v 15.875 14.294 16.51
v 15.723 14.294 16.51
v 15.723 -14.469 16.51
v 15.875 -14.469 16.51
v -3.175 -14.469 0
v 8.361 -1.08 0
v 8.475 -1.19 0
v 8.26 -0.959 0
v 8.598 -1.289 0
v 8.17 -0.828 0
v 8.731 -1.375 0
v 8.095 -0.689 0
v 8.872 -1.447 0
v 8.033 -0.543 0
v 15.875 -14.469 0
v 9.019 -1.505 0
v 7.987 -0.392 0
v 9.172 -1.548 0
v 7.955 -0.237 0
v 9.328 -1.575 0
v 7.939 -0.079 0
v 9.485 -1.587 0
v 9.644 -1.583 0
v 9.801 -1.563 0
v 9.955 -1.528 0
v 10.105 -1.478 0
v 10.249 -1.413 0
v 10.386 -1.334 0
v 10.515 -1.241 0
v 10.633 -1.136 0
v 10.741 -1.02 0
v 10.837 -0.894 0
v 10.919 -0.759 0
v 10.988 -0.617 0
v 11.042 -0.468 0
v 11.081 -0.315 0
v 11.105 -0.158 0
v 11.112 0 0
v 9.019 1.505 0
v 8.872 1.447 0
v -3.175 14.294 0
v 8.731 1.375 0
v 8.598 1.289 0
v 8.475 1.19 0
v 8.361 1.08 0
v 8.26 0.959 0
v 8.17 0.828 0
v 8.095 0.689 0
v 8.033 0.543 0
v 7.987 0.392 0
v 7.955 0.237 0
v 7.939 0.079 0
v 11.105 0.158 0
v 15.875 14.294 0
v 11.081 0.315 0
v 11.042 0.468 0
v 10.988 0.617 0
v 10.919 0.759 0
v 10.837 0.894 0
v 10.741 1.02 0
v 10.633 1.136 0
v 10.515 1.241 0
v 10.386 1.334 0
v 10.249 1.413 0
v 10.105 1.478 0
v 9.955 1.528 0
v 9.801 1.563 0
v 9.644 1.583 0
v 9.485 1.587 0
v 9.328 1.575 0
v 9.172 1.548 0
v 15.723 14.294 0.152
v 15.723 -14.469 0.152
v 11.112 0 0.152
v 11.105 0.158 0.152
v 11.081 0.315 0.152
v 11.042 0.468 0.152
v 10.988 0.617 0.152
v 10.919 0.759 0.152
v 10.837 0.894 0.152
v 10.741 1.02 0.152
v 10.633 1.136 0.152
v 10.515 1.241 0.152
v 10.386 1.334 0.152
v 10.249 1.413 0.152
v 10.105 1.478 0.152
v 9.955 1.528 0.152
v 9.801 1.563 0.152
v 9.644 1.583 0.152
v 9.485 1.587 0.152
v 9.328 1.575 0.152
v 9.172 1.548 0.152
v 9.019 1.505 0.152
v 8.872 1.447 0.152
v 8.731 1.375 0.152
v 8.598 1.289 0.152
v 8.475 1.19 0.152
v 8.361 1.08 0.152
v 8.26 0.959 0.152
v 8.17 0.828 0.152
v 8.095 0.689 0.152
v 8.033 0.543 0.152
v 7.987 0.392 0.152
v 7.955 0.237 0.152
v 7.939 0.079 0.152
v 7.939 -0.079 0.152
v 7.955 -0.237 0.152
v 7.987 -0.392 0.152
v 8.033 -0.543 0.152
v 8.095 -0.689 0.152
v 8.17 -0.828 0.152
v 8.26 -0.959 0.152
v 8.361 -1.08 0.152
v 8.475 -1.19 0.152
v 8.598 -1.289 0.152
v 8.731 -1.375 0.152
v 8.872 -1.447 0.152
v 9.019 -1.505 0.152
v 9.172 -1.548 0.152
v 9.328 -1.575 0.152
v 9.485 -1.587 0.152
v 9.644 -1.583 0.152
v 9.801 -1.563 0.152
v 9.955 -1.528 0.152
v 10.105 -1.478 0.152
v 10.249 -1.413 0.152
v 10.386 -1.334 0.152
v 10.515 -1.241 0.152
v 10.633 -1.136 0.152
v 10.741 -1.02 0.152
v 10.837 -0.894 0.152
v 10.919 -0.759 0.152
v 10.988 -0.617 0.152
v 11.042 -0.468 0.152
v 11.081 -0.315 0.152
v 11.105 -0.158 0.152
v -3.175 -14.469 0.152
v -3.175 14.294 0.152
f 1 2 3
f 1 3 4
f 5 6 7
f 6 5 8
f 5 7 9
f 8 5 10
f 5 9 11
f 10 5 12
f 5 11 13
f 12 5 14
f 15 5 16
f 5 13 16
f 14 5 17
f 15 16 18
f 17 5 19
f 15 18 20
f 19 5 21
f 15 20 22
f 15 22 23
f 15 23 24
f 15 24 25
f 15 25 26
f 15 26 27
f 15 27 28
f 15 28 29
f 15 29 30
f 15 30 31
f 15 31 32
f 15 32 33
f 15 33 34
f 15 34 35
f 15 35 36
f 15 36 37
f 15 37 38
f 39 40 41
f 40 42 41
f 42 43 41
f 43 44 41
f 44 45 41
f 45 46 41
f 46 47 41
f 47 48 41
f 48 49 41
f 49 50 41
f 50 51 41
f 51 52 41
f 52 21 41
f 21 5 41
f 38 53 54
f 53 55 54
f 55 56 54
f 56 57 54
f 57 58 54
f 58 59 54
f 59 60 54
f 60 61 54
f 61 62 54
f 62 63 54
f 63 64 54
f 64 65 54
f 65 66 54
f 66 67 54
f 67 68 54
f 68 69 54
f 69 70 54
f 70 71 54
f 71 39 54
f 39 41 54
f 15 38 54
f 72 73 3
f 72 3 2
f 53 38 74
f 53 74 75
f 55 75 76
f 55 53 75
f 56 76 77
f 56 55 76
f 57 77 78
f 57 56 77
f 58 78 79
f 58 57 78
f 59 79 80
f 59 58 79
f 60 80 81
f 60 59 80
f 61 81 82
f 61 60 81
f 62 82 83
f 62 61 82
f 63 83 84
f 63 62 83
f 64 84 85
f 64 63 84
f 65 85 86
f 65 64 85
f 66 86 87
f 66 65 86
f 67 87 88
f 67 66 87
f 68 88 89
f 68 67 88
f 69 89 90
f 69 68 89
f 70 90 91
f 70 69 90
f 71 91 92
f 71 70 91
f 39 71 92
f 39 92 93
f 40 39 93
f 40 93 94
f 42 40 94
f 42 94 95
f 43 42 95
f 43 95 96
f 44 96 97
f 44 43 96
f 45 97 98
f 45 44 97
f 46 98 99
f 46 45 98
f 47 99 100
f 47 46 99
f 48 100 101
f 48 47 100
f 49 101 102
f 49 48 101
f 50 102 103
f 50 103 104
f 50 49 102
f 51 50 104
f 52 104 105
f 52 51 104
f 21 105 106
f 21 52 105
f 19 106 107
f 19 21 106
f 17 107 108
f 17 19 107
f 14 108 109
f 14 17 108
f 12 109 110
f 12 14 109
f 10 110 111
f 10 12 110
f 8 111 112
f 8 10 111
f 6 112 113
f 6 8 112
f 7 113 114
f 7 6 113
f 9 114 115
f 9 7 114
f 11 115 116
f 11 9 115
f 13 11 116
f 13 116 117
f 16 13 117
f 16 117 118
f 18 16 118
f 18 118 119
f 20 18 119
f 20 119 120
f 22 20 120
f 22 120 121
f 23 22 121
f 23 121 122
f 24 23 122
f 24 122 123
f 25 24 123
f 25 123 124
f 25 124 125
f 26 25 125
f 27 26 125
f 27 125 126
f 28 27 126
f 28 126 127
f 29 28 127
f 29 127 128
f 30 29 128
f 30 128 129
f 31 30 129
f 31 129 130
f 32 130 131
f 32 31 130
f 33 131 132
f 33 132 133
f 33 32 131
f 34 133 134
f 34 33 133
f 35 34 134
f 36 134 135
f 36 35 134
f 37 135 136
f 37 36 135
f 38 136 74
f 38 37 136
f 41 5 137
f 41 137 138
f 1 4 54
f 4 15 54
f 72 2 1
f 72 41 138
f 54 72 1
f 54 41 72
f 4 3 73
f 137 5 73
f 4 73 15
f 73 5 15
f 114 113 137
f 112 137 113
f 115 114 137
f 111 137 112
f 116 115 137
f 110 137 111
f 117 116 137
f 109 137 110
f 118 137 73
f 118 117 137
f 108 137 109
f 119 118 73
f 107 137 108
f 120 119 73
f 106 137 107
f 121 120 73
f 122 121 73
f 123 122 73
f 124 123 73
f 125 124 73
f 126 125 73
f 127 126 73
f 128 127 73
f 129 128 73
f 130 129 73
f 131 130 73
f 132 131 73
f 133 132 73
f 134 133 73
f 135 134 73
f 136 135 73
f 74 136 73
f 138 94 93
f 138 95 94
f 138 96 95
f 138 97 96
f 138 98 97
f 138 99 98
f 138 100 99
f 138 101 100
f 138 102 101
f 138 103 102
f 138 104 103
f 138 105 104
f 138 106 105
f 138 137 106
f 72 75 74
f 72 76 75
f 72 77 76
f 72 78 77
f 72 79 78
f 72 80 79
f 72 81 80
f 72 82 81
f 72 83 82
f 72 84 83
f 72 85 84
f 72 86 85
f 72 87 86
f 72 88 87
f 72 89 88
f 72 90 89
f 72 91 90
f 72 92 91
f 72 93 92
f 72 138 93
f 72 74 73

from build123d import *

# Parameters (mm, degrees)
SKETCH1_W           = 19.05
SKETCH1_H           = 28.763083029
SKETCH1_R           = 1.5875
BOSS_EXTRUDE1_DEPTH = 0.1524
SKETCH2_W           = 0.1524
SKETCH2_H           = 28.763083029
BOSS_EXTRUDE2_DEPTH = 16.357339


with BuildPart() as part:
    # Sketch1 → Boss-Extrude1 (new body)
    with BuildSketch(Plane.XY):
        with Locations((6.35, -0.087691515)):
            Rectangle(SKETCH1_W, SKETCH1_H)
        with Locations((9.525, 0)):
            Circle(SKETCH1_R, mode=Mode.SUBTRACT)
    extrude(amount=BOSS_EXTRUDE1_DEPTH)

    # Sketch2 → Boss-Extrude2 (add)
    with BuildSketch(Plane.XY.offset(0.1524)):
        with Locations((15.7988, -0.087691515)):
            Rectangle(SKETCH2_W, SKETCH2_H)
    extrude(amount=BOSS_EXTRUDE2_DEPTH)


solid = part.part
